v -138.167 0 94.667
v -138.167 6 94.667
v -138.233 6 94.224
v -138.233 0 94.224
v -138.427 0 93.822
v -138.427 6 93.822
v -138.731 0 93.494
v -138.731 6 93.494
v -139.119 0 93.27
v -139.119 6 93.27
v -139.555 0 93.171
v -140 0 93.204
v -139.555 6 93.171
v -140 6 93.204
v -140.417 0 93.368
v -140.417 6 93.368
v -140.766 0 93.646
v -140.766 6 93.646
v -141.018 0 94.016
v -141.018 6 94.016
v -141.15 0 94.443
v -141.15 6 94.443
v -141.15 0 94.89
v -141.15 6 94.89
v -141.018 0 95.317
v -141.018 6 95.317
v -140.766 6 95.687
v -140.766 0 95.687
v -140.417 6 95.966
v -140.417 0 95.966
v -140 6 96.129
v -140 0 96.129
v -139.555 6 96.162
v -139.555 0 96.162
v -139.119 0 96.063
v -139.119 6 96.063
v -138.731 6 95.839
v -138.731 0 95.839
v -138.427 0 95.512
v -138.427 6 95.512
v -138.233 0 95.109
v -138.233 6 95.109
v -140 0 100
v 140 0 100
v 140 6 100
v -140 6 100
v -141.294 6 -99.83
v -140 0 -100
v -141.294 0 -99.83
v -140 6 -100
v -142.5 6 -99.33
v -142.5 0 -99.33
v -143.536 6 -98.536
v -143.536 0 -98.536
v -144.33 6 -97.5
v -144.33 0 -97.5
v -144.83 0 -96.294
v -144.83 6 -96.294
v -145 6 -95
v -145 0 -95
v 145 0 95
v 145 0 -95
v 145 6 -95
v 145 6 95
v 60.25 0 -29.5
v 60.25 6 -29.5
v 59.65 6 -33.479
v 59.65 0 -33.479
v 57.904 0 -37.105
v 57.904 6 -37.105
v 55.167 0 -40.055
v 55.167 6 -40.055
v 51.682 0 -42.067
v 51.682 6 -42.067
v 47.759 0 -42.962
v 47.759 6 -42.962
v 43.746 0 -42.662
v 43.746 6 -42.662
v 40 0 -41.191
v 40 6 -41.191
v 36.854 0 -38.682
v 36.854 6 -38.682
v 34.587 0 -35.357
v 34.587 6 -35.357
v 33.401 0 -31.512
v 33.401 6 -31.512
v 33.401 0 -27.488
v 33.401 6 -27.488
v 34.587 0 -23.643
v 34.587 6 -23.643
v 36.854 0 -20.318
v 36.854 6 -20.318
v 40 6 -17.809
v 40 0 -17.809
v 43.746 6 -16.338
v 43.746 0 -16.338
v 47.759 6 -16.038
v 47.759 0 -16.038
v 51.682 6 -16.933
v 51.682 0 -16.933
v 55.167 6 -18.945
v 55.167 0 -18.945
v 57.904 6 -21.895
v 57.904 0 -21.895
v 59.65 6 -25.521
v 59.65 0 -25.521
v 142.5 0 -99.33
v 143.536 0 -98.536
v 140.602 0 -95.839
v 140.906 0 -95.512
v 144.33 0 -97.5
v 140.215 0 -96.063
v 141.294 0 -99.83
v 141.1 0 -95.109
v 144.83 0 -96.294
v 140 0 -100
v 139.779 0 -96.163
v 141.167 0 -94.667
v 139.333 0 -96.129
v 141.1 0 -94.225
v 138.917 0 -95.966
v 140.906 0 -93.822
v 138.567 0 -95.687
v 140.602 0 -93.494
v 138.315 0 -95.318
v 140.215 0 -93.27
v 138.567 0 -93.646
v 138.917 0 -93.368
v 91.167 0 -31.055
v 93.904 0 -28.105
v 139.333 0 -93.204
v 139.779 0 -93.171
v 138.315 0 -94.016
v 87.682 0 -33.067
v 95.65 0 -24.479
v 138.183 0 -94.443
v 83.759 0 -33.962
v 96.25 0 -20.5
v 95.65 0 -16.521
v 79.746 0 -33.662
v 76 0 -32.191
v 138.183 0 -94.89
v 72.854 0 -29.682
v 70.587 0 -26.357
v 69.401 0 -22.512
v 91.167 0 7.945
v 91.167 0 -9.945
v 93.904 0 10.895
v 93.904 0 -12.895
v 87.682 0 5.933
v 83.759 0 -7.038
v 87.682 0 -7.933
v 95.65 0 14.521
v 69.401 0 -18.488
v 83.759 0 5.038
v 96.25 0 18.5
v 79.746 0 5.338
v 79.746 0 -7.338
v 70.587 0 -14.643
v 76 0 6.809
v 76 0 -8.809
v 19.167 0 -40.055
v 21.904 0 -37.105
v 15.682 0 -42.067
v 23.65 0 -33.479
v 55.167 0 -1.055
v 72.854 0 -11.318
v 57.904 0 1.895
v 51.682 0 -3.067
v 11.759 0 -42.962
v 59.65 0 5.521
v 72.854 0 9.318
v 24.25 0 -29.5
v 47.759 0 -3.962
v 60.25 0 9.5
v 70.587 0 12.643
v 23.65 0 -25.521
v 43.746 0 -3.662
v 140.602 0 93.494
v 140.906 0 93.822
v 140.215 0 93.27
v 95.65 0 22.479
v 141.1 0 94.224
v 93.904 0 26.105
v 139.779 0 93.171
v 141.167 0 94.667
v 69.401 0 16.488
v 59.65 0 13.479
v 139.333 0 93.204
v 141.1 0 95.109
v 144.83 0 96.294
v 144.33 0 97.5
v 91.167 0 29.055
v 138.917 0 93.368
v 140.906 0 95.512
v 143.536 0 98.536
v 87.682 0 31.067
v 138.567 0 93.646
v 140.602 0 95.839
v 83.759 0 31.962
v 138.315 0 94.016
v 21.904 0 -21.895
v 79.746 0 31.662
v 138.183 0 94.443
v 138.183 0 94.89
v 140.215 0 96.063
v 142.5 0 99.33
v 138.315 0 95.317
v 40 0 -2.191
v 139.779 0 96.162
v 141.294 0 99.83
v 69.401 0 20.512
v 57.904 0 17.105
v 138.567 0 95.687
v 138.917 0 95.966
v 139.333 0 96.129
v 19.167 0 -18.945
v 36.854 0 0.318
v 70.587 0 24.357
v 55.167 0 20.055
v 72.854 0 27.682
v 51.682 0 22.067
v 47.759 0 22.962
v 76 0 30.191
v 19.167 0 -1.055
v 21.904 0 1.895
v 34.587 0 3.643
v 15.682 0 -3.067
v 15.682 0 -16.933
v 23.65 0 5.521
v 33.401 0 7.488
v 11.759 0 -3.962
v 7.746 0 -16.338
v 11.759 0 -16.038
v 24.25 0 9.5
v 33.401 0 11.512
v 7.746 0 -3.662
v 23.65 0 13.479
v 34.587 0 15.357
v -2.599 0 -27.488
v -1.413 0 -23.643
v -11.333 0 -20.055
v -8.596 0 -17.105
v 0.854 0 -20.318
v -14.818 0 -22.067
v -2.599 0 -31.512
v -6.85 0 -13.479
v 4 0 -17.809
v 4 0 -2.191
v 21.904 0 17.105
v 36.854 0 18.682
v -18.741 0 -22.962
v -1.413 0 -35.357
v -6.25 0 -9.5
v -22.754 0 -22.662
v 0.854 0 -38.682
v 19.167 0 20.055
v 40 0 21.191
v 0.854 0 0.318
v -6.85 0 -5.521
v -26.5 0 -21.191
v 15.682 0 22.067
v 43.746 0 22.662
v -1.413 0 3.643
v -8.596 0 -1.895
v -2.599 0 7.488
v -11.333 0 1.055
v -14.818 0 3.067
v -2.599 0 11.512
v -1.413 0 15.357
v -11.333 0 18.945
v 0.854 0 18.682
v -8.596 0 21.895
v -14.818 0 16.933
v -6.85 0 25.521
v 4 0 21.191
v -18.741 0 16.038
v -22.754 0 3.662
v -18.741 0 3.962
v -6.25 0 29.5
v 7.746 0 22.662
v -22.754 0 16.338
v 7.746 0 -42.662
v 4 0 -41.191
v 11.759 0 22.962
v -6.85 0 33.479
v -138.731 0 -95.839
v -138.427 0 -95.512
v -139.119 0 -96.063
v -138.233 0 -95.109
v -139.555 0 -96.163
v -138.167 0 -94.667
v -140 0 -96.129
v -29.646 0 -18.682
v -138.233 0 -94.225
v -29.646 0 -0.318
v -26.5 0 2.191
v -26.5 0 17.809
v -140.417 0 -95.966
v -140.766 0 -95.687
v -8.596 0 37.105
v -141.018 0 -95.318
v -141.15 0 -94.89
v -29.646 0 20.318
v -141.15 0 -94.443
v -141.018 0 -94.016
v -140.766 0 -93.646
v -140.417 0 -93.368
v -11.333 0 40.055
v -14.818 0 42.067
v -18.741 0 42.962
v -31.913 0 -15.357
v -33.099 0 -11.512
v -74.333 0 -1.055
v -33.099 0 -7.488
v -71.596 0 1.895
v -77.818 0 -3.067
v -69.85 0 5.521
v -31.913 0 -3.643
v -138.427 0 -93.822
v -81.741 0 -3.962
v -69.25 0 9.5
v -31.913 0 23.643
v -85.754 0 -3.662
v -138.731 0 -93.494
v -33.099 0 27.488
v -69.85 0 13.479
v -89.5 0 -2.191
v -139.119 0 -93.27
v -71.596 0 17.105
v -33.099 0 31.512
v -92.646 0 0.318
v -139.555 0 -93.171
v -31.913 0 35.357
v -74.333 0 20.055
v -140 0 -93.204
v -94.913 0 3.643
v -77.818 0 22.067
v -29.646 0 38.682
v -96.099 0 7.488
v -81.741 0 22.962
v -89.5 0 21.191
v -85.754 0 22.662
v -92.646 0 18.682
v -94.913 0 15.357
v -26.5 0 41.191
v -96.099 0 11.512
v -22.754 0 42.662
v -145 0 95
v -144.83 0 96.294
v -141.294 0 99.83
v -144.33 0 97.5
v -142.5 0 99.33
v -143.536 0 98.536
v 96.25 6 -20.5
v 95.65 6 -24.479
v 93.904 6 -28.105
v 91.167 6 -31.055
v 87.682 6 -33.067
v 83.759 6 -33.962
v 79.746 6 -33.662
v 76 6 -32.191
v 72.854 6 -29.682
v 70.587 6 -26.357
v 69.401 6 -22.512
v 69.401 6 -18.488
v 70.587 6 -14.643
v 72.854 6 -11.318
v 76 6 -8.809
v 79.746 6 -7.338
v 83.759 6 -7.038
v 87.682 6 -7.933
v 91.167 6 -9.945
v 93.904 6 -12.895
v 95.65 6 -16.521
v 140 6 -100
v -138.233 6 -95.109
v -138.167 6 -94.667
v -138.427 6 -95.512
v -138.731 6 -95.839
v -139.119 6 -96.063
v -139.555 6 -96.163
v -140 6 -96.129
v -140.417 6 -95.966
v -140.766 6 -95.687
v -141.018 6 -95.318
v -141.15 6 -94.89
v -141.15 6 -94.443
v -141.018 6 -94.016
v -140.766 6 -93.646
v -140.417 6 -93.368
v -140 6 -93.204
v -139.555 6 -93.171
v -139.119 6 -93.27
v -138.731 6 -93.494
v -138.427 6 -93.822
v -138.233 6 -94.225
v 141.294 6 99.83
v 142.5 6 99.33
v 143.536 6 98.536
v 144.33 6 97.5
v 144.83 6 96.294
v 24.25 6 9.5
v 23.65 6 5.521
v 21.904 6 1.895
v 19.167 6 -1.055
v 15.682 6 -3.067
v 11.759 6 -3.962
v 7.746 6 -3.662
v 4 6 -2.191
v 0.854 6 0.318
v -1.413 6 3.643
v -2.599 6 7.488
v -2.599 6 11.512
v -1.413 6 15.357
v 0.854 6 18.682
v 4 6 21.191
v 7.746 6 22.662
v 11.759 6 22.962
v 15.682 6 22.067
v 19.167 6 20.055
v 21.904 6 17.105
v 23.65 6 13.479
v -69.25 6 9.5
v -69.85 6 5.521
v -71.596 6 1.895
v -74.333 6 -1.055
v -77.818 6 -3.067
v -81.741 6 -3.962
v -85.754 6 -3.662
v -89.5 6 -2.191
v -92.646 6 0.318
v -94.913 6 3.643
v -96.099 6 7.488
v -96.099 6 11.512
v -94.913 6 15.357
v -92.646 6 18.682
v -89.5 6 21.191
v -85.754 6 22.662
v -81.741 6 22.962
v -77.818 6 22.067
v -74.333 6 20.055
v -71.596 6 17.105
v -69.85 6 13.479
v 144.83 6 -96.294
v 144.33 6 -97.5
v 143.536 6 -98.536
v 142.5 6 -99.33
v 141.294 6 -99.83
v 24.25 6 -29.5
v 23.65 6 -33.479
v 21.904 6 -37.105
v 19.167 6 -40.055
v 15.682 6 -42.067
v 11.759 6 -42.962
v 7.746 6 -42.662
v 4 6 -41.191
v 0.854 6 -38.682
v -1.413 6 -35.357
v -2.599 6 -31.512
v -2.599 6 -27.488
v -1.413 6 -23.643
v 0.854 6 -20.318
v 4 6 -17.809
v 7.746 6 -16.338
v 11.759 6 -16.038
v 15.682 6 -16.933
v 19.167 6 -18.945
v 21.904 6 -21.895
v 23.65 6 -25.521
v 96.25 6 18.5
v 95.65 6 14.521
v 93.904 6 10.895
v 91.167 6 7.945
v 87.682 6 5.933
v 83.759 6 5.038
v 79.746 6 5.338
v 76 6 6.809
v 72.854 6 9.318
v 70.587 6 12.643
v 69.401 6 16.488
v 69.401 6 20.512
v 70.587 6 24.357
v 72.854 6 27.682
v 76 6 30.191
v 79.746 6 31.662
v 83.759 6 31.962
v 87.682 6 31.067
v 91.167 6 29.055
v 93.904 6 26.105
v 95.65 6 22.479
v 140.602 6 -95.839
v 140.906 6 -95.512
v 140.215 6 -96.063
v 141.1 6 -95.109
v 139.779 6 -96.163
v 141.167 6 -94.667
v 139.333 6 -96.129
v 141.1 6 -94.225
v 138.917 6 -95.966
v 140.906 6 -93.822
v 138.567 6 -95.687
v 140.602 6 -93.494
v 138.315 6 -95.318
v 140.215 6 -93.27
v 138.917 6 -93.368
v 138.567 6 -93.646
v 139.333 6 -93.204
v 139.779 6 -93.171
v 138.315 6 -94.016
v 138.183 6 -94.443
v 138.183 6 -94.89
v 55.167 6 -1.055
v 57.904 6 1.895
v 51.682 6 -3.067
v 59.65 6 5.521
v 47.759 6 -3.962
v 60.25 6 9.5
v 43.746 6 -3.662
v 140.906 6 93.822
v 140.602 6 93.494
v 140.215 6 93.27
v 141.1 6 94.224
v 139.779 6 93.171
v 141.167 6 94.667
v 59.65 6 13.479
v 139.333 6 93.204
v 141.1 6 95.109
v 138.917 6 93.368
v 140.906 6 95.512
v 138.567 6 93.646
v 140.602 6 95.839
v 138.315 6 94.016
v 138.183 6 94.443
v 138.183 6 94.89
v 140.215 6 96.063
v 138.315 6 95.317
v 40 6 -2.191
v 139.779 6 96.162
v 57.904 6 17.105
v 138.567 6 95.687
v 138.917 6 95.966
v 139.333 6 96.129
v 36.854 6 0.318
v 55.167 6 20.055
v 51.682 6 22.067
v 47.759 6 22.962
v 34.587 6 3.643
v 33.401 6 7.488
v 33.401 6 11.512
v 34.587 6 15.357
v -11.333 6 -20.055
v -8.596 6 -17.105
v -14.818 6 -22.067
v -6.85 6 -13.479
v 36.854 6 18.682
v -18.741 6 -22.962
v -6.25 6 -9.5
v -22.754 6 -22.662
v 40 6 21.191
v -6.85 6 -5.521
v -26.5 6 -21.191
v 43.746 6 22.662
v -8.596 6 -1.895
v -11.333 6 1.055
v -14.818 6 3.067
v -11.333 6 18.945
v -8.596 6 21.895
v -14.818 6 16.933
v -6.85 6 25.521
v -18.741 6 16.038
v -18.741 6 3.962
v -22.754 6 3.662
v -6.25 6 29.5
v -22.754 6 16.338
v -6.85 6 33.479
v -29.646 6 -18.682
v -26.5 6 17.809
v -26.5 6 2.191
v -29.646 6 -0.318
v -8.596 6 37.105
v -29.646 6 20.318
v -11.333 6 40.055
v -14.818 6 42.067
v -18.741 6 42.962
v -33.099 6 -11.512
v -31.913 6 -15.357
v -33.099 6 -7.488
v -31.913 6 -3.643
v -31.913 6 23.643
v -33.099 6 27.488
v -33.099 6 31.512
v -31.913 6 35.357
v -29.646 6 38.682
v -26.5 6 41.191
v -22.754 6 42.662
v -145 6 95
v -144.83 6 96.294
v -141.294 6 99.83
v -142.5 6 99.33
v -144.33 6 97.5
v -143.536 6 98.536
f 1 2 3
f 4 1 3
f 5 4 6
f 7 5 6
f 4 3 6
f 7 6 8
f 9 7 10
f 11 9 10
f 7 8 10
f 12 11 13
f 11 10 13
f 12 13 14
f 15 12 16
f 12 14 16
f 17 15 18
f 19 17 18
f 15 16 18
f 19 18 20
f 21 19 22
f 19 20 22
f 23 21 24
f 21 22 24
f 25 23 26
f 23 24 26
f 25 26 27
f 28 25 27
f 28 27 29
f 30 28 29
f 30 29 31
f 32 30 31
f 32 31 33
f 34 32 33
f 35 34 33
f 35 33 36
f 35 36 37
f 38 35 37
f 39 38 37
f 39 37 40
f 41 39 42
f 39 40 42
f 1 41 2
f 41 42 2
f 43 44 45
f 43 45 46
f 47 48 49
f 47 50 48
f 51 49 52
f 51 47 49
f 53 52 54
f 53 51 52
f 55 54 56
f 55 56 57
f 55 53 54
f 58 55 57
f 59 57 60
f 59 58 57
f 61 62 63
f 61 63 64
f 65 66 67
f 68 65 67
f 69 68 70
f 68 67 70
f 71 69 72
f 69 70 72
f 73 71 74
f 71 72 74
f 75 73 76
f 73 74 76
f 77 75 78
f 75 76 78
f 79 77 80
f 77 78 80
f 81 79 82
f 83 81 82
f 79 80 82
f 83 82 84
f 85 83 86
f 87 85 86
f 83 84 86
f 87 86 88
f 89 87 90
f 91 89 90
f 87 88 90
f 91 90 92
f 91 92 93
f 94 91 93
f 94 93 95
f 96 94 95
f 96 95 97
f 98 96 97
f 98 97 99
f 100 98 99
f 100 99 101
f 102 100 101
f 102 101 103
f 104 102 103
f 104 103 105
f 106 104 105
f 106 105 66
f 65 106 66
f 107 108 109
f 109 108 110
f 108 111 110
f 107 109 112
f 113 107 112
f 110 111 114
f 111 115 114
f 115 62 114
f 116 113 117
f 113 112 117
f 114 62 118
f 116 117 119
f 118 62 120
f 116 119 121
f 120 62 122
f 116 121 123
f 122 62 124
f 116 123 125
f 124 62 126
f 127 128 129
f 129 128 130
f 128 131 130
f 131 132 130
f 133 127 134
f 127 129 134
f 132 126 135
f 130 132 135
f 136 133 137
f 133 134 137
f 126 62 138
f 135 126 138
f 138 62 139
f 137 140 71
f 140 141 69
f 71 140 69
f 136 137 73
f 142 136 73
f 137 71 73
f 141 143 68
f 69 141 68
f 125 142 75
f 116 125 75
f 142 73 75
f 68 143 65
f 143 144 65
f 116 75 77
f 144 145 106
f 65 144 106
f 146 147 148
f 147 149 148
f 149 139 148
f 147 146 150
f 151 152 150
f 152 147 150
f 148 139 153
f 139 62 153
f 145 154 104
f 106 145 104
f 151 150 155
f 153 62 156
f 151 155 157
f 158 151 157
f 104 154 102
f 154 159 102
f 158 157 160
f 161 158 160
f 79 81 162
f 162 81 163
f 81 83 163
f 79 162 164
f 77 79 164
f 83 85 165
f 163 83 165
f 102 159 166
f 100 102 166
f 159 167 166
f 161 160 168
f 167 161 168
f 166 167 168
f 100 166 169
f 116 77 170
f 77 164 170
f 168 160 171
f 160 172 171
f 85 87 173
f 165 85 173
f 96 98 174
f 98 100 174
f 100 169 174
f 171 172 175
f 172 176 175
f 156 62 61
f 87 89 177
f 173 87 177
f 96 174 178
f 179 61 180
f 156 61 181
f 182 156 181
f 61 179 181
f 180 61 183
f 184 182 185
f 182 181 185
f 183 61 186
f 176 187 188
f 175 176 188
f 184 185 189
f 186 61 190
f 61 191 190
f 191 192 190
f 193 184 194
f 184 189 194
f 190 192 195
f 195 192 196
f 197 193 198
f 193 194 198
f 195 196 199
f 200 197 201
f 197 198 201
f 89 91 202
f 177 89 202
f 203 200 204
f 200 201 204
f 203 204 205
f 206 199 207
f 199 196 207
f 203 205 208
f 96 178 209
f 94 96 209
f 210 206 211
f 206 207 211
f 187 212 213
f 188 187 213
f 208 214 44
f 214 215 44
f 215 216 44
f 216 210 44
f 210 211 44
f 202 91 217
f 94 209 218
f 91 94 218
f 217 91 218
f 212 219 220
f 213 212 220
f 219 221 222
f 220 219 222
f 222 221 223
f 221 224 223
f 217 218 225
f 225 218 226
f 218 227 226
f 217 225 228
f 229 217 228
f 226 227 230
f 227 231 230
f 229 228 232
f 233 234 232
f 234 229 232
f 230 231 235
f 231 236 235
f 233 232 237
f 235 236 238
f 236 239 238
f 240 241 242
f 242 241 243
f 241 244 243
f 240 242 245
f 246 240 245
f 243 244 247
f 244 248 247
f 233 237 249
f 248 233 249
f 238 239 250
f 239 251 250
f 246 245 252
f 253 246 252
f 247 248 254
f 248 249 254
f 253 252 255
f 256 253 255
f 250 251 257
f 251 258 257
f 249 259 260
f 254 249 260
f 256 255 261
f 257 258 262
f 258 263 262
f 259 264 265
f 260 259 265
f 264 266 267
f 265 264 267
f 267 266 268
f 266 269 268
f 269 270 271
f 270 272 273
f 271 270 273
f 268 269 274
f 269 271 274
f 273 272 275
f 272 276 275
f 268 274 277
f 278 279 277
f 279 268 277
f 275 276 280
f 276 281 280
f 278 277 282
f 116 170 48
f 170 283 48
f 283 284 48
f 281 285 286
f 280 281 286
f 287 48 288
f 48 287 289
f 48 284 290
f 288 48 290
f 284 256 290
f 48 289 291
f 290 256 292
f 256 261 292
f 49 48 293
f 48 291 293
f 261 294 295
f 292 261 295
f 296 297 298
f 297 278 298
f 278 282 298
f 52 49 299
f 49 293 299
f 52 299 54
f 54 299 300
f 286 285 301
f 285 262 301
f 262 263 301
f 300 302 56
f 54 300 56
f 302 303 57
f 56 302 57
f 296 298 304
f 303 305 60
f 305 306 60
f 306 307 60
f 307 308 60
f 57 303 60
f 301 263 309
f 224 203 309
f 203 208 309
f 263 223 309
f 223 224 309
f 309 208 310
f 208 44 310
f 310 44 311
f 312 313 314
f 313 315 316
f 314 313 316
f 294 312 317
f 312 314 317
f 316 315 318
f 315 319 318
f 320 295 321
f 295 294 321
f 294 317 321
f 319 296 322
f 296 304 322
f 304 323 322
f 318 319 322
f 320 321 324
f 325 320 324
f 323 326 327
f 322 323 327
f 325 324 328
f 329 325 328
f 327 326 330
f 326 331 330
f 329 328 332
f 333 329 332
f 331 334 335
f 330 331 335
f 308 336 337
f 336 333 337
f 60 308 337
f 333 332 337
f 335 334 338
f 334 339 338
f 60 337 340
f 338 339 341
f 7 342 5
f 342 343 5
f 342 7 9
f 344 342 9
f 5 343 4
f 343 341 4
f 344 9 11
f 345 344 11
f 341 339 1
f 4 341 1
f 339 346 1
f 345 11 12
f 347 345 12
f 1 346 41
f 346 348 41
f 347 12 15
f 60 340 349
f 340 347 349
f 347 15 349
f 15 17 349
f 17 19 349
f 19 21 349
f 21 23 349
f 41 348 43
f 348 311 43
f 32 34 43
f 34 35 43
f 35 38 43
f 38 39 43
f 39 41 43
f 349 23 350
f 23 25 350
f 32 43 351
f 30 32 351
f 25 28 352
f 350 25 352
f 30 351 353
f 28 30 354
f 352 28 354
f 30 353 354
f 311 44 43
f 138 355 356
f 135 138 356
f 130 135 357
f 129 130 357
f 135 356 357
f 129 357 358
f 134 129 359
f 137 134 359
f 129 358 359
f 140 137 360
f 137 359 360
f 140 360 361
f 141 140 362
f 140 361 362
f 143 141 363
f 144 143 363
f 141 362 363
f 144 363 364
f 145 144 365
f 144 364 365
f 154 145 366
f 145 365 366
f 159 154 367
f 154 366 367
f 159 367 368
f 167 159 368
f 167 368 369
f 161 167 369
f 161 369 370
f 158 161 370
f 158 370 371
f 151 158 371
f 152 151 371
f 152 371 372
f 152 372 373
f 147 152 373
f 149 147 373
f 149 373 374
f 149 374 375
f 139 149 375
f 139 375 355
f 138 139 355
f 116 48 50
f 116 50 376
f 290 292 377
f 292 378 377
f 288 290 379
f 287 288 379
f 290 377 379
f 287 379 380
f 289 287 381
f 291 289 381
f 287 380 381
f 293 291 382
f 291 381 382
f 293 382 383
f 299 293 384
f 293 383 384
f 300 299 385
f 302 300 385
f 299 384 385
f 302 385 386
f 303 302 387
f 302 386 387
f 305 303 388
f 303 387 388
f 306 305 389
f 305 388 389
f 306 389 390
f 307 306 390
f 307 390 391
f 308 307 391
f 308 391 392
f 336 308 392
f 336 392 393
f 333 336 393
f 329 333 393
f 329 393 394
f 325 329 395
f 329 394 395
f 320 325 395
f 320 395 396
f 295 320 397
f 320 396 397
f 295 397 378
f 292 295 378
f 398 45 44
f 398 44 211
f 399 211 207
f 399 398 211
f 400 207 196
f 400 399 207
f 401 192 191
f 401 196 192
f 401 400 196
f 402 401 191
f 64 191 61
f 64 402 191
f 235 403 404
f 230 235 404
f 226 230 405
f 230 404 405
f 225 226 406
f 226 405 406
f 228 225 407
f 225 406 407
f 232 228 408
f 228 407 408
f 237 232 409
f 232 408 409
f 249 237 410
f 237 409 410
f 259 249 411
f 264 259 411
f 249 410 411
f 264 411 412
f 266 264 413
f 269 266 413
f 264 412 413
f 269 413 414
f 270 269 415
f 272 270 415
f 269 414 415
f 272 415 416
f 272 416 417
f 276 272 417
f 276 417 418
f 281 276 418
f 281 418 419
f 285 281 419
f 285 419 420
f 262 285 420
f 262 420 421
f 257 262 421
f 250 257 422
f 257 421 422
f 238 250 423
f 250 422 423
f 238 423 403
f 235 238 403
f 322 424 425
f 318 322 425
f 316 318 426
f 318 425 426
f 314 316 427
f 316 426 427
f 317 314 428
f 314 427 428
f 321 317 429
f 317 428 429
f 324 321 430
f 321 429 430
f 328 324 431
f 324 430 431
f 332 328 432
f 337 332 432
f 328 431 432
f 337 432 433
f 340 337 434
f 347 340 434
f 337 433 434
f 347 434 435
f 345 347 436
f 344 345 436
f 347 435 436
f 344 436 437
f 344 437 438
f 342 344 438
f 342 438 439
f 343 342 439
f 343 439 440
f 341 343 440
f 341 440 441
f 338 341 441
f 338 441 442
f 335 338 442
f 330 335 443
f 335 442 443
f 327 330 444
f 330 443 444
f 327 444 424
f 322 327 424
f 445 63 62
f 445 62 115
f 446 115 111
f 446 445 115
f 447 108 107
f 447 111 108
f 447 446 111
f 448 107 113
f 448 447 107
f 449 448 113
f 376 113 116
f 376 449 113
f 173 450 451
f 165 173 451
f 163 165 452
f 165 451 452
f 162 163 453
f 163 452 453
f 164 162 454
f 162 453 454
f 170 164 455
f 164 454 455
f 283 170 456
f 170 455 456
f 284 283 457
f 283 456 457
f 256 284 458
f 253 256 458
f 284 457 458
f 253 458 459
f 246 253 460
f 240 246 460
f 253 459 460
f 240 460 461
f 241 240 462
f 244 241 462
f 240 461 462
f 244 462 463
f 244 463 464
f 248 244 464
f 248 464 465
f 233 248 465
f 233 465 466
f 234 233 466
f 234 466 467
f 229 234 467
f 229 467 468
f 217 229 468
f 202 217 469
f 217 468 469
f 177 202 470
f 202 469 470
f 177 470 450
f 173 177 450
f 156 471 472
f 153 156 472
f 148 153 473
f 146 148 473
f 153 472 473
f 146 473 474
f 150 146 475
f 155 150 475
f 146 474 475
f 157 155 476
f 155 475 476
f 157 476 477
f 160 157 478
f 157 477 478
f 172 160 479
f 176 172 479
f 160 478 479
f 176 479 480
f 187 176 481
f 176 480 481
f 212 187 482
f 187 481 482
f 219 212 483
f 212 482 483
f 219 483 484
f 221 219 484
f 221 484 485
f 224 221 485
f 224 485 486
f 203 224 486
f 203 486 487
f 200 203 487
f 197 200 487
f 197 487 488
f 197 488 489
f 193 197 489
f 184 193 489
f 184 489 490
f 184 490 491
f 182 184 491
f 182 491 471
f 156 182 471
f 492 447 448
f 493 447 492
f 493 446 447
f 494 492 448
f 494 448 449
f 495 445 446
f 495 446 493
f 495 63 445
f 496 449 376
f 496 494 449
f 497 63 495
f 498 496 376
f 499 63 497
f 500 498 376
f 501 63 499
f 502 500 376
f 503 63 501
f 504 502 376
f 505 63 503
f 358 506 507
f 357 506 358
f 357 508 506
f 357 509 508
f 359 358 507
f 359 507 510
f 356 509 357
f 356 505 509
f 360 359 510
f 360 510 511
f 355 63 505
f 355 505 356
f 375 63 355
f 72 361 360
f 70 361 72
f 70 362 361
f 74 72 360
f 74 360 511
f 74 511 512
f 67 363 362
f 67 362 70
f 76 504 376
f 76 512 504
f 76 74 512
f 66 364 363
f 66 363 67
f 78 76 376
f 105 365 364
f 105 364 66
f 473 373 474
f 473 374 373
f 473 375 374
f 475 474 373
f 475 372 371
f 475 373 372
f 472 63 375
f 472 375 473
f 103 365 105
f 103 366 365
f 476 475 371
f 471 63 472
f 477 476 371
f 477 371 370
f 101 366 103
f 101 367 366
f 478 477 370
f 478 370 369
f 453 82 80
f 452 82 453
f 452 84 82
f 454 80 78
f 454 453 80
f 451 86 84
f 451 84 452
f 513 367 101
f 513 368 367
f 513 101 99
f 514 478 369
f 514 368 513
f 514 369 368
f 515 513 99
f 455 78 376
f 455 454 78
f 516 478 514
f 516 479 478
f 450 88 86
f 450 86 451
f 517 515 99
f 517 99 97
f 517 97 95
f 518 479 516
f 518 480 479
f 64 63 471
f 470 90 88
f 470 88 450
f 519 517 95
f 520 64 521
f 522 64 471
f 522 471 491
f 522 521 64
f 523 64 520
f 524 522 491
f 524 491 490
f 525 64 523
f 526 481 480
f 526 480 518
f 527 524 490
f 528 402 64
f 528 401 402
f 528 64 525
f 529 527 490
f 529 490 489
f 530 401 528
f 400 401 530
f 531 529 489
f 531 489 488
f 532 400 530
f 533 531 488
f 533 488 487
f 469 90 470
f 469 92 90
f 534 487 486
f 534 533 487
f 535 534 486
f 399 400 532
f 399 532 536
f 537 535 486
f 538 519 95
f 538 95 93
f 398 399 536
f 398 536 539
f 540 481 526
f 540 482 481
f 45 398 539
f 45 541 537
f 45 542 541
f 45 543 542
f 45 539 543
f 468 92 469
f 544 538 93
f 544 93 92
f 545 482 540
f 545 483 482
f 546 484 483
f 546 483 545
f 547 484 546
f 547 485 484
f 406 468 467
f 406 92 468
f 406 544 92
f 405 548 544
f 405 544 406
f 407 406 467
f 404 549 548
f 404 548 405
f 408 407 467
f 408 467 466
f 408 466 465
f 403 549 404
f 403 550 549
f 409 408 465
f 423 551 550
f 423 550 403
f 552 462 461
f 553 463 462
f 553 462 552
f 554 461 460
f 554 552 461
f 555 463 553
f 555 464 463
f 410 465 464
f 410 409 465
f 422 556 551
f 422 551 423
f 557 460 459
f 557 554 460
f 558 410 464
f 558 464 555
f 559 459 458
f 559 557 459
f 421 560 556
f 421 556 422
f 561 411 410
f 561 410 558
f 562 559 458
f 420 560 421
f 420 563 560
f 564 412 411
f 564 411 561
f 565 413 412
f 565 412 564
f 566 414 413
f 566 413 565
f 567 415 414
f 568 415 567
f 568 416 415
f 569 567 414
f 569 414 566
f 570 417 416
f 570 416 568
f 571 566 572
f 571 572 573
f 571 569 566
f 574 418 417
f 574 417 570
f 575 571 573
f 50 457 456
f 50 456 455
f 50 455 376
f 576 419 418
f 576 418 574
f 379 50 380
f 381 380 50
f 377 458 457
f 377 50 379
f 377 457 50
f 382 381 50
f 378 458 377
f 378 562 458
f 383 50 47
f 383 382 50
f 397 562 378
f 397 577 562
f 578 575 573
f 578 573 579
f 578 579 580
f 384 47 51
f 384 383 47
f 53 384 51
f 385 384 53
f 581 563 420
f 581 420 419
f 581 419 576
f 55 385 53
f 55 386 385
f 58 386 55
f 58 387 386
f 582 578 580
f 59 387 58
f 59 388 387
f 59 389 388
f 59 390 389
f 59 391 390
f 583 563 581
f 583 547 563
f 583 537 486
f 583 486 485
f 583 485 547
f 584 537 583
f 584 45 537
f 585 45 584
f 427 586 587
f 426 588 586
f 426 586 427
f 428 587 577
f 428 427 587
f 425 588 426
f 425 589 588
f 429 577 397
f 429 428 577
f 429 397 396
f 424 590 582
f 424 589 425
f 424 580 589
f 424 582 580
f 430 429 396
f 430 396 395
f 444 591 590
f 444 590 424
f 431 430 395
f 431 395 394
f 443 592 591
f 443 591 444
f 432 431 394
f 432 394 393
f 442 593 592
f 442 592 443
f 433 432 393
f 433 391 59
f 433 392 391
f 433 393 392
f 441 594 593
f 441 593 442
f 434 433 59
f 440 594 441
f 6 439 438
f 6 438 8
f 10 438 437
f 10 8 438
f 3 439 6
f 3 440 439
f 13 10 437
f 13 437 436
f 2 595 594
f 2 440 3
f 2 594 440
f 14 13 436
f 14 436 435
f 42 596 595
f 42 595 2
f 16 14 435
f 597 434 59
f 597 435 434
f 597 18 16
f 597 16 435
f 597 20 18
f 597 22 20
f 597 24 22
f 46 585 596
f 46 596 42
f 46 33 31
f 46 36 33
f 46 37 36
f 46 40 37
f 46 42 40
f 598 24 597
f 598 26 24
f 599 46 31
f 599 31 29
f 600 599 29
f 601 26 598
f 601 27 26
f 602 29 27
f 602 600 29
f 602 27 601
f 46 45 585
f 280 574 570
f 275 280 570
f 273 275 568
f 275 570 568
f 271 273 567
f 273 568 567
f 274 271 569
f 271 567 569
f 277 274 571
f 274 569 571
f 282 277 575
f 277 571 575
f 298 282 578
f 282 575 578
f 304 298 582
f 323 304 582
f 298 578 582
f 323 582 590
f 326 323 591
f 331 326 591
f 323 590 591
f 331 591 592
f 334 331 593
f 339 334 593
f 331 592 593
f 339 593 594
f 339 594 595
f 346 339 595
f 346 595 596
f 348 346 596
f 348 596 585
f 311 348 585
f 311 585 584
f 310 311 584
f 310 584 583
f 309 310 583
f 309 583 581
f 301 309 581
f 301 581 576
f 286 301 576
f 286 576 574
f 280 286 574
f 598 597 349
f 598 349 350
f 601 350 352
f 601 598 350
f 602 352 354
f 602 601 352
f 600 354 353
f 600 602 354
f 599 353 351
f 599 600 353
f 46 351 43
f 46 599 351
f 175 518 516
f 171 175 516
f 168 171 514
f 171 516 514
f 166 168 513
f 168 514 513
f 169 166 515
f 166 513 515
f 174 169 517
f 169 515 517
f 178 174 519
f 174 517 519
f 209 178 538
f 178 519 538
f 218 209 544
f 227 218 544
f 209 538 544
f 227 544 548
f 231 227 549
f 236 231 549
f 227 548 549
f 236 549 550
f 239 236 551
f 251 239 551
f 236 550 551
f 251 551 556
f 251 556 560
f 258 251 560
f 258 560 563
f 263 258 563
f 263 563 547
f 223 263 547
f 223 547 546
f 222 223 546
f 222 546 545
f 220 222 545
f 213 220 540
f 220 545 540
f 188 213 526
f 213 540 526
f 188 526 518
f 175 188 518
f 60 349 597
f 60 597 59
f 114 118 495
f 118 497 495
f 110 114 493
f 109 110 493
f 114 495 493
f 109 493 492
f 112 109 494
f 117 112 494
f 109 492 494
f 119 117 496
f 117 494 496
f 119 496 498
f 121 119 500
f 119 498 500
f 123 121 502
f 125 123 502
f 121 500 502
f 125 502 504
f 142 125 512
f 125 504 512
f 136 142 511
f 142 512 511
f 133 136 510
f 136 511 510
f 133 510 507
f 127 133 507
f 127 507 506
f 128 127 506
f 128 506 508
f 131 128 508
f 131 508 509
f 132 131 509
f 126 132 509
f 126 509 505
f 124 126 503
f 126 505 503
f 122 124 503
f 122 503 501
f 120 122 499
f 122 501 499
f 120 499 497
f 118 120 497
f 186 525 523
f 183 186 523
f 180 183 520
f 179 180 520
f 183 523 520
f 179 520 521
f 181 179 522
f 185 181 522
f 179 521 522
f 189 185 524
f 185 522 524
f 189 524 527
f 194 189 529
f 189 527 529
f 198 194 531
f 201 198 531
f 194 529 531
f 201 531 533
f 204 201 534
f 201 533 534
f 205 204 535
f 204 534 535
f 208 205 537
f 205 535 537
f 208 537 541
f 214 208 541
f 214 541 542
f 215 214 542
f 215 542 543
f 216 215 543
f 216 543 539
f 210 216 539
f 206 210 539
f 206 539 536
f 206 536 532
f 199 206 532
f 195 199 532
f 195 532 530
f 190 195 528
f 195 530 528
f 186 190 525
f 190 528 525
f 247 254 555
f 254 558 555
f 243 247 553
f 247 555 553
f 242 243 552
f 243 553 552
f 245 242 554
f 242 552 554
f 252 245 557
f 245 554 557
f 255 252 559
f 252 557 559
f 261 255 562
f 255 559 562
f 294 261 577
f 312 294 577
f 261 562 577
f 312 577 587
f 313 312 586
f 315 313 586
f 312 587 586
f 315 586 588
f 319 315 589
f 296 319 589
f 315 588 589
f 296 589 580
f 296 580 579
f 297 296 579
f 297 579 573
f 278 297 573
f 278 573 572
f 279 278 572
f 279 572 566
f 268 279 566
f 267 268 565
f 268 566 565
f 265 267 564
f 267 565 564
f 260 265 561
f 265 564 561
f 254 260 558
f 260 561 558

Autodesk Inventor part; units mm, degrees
ref_plane "YZ Plane" through (0, 0, 0) normal (1, 0, 0) x (0, 1, 0)
ref_plane "XZ Plane" through (0, 0, 0) normal (0, 1, 0) x (-1, 0, 0)
ref_plane "XY Plane" through (0, 0, 0) normal (0, 0, 1) x (1, 0, 0)
sketch "Sketch1" plane through (0, 0, 0) normal (0, 1, 0) x (-1, 0, 0)
  line L0 (145, -100) -> (-145, -100)
  line L1 (-145, -100) -> (-145, 100)
  line L2 (-145, 100) -> (145, 100)
  line L3 (145, 100) -> (145, -100)
  line L4 (203, 0) -> (-203, 0) projected
  line L5 (0, -140) -> (0, 140) projected
  point P0 (0, 0)
  dimension "d30" = 290
  dimension "d31" = 200
extrude "Extrusion1" add sketch "Sketch1" along normal blind 6
sketch "Sketch2" plane through (0, 6, 0) normal (0, 1, 0) x (1, 0, 0)
  circle A0 centre (-19.75, -29.5) radius 13.5
  circle A1 centre (-82.75, -9.5) radius 13.5
  circle A2 centre (-19.75, 9.5) radius 13.5
  circle A3 centre (46.75, 29.5) radius 13.5
  circle A4 centre (82.75, 20.5) radius 13.5
  circle A5 centre (10.75, 29.5) radius 13.5
  circle A6 centre (10.75, -9.5) radius 13.5
  circle A7 centre (46.75, -9.5) radius 13.5
  circle A8 centre (82.75, -18.5) radius 13.5
  line L0 (-96.25, 43) -> (96.25, 43)
  line L1 (96.25, 43) -> (96.25, -43)
  line L2 (96.25, -43) -> (-96.25, -43)
  line L3 (-96.25, -43) -> (-96.25, 43)
  line L4 (145, 100) -> (-145, 100) projected
  line L5 (145, -100) -> (145, 100) projected
  line L6 (0, 140) -> (0, -140) projected
  line L7 (-203, 0) -> (203, 0) projected
  dimension "d3" = 27
  dimension "d19" = 30.5
  dimension "d20" = 36
  dimension "d23" = 19
  dimension "d24" = 9
  dimension "d25" = 36
  dimension "d26" = 11
  dimension "d27" = 9
  dimension "d28" = 11
  dimension "d29" = 63
extrude "Extrusion2" cut sketch "Sketch2" against normal blind 10 contours A0 | A8 | L6 A6 L7 | A6 L6 | A1 L7 | A1 L7 | A4 | A3 | A6 L7 | L7 A7 | A7 L7 | L6 A5 | A5 L6 | L7 A2 | A2 L7 picked at (6.7806, -6.3333)
fillet "Fillet1" radius 5 4 edges at (-145, 3, 100) (145, 3, 100) (145, 3, -100) (-145, 3, -100)
sketch "Sketch3" plane through (0, 6, 0) normal (0, 1, 0) x (1, 0, 0)
  circle A0 centre (-139.6667, 94.6667) radius 1.5
  line L0 (140, 100) -> (-140, 100) projected
  line L1 (-145, 95) -> (-145, -95) projected
  point P0 (0, 0)
  dimension "d35" = 5.3333
  dimension "d36" = 5.3333
  dimension "d37" = 3
extrude "Extrusion3" cut sketch "Sketch3" against normal blind 10
pattern_linear "Rectangular Pattern1" count 2 spacing 279.3333 along (1, 0, 0) count 2 spacing 189.3333 along (0, 0, 1) of "Extrusion3"
equation "\"d30\" = BoxLength"
equation "\"d31\" = BoxWidth"
equation "\"d0\" = SheetThickness"
equation "\"d3\" = button_hole_outer"
equation "\"d35\" = 0.666667 * CornerOffset + 0.333333 * SheetThickness"
equation "\"d36\" = 0.666667 * CornerOffset + 0.333333 * SheetThickness"
equation "\"d42\" = BoxLength - 1.33333 * CornerOffset - 0.666667 * SheetThickness"
equation "\"d45\" = BoxWidth - 1.33333 * CornerOffset - 0.666667 * SheetThickness"
equation "\"button_hole_outer\" = 27"
equation "\"BoxLength\" = 290"
equation "\"BoxWidth\" = 200"
equation "\"SheetThickness\" = 6"
equation "\"CornerOffset\" = 5"
properties part number "sega_straight"
